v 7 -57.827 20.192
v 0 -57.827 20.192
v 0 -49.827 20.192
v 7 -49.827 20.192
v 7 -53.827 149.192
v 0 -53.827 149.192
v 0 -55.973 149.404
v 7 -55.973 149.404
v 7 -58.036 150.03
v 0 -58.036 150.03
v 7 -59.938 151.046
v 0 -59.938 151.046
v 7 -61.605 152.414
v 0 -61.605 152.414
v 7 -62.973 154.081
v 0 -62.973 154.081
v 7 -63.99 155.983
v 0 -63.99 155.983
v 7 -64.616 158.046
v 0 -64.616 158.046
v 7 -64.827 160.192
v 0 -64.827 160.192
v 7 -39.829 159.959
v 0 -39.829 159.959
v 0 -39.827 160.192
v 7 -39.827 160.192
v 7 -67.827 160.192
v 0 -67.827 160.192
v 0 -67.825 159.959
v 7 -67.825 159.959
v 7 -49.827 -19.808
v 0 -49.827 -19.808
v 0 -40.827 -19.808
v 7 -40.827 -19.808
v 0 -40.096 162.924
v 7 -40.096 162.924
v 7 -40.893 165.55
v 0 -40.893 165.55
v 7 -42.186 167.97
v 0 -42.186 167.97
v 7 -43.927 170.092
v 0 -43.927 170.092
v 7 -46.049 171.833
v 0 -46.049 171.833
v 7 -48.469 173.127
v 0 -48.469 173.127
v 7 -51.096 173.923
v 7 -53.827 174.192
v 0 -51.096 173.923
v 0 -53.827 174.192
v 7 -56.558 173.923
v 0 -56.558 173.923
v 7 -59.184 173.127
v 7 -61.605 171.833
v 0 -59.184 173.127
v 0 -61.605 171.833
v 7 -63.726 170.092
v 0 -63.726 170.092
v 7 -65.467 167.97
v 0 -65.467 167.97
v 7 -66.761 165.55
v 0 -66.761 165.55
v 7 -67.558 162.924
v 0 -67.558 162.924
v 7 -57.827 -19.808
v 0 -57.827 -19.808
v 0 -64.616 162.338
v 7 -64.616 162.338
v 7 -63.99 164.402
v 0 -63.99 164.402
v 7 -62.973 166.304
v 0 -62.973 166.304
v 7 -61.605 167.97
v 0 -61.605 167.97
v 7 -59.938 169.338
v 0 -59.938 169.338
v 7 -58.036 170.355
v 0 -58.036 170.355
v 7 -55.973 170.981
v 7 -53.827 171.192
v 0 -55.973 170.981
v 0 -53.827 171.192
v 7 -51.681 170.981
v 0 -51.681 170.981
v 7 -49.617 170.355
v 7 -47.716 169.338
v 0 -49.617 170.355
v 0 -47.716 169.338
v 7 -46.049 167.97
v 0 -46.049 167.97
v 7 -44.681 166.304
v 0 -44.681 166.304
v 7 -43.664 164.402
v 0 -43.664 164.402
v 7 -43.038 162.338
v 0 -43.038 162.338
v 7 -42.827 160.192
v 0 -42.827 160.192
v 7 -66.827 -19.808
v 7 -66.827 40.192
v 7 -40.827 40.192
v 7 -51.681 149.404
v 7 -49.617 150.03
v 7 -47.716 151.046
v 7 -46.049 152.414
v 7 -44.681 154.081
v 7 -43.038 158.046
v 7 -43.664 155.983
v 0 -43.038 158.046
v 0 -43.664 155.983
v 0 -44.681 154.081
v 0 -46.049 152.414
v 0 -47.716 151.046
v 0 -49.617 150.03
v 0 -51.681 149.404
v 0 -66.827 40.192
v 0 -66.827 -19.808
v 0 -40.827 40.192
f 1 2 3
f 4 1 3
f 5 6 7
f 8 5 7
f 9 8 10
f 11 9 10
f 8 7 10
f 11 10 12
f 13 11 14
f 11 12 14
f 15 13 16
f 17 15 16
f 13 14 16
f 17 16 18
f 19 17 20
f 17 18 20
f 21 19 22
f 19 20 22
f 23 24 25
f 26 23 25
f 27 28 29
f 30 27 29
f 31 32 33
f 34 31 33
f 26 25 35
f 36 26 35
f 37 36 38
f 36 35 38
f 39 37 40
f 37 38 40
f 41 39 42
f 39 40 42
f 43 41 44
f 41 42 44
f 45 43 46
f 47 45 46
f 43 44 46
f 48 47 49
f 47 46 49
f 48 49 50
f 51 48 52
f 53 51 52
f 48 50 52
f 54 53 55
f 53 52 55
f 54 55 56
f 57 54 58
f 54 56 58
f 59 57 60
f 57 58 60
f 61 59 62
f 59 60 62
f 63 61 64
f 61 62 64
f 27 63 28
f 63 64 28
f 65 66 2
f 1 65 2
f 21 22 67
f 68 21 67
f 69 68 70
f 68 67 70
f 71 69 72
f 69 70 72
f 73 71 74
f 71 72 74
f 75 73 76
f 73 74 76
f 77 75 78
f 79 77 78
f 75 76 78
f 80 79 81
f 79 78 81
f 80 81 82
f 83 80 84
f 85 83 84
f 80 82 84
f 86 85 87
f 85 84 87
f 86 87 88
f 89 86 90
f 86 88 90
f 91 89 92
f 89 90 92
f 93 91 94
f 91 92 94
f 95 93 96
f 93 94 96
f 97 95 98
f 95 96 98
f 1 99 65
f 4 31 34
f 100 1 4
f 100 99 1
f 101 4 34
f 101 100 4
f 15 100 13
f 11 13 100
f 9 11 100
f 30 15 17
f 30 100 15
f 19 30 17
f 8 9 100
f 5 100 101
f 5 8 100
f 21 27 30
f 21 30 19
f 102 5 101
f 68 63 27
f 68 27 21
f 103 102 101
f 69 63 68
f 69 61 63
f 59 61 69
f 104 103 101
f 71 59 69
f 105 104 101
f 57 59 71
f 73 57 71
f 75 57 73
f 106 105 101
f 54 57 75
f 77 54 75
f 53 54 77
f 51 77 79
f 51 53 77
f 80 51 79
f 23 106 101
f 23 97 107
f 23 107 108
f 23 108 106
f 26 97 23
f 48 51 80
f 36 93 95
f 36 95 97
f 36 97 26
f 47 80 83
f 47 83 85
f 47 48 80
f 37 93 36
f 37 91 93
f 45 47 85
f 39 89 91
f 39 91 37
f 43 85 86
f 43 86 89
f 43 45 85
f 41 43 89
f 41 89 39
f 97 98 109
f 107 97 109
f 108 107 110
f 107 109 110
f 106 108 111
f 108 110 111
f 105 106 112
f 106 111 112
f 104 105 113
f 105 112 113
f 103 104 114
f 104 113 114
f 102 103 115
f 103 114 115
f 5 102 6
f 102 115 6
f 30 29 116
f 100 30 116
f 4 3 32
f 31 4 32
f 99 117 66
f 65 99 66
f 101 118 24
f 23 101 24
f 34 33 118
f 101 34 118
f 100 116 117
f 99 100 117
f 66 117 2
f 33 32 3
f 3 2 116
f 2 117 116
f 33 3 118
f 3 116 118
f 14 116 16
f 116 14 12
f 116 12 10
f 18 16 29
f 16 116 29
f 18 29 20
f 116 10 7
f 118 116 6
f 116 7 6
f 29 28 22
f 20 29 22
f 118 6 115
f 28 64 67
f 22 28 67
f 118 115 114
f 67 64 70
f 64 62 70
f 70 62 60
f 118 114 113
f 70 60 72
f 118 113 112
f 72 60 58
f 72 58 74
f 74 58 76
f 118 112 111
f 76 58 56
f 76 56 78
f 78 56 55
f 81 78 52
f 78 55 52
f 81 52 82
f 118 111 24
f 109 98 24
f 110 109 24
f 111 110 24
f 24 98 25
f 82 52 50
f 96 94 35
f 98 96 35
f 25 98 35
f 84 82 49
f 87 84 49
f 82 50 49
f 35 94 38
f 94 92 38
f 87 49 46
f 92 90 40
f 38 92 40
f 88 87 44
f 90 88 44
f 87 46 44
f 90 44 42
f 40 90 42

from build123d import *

# Parameters (mm, degrees)
F1_DEPTH = 7


with BuildPart() as f1:
    # F0 (on Right) → F1 (new body)
    with BuildSketch(Plane.YZ):
        with BuildLine():
            Line((-57.826925, -19.807692), (-57.826925, 20.192308))
            Line((-57.826925, 20.192308), (-49.826925, 20.192308))
            Line((-49.826925, 20.192308), (-49.826925, -19.807692))
            Line((-49.826925, -19.807692), (-40.826925, -19.807692))
            Line((-40.826925, -19.807692), (-40.826925, 40.192308))
            Line((-40.826925, 40.192308), (-39.828869, 159.95899))
            Line((-39.828869, 159.95899), (-39.826925, 160.192308))
            ThreePointArc((-39.826925, 160.192308), (-53.826925, 174.192308), (-67.826925, 160.192308))
            Line((-67.826925, 160.192308), (-67.82498, 159.95899))
            Line((-67.82498, 159.95899), (-66.826925, 40.192308))
            Line((-66.826925, 40.192308), (-66.826925, -19.807692))
            Line((-66.826925, -19.807692), (-57.826925, -19.807692))
        make_face()
        with BuildLine():
            ThreePointArc((-42.826925, 160.192308), (-46.04875, 152.414133), (-53.826925, 149.192308))
            ThreePointArc((-53.826925, 149.192308), (-61.605099, 152.414133), (-64.826925, 160.192308))
            ThreePointArc((-64.826925, 160.192308), (-53.826925, 171.192308), (-42.826925, 160.192308))
        make_face(mode=Mode.SUBTRACT)
    extrude(amount=F1_DEPTH)


solid = f1.part
